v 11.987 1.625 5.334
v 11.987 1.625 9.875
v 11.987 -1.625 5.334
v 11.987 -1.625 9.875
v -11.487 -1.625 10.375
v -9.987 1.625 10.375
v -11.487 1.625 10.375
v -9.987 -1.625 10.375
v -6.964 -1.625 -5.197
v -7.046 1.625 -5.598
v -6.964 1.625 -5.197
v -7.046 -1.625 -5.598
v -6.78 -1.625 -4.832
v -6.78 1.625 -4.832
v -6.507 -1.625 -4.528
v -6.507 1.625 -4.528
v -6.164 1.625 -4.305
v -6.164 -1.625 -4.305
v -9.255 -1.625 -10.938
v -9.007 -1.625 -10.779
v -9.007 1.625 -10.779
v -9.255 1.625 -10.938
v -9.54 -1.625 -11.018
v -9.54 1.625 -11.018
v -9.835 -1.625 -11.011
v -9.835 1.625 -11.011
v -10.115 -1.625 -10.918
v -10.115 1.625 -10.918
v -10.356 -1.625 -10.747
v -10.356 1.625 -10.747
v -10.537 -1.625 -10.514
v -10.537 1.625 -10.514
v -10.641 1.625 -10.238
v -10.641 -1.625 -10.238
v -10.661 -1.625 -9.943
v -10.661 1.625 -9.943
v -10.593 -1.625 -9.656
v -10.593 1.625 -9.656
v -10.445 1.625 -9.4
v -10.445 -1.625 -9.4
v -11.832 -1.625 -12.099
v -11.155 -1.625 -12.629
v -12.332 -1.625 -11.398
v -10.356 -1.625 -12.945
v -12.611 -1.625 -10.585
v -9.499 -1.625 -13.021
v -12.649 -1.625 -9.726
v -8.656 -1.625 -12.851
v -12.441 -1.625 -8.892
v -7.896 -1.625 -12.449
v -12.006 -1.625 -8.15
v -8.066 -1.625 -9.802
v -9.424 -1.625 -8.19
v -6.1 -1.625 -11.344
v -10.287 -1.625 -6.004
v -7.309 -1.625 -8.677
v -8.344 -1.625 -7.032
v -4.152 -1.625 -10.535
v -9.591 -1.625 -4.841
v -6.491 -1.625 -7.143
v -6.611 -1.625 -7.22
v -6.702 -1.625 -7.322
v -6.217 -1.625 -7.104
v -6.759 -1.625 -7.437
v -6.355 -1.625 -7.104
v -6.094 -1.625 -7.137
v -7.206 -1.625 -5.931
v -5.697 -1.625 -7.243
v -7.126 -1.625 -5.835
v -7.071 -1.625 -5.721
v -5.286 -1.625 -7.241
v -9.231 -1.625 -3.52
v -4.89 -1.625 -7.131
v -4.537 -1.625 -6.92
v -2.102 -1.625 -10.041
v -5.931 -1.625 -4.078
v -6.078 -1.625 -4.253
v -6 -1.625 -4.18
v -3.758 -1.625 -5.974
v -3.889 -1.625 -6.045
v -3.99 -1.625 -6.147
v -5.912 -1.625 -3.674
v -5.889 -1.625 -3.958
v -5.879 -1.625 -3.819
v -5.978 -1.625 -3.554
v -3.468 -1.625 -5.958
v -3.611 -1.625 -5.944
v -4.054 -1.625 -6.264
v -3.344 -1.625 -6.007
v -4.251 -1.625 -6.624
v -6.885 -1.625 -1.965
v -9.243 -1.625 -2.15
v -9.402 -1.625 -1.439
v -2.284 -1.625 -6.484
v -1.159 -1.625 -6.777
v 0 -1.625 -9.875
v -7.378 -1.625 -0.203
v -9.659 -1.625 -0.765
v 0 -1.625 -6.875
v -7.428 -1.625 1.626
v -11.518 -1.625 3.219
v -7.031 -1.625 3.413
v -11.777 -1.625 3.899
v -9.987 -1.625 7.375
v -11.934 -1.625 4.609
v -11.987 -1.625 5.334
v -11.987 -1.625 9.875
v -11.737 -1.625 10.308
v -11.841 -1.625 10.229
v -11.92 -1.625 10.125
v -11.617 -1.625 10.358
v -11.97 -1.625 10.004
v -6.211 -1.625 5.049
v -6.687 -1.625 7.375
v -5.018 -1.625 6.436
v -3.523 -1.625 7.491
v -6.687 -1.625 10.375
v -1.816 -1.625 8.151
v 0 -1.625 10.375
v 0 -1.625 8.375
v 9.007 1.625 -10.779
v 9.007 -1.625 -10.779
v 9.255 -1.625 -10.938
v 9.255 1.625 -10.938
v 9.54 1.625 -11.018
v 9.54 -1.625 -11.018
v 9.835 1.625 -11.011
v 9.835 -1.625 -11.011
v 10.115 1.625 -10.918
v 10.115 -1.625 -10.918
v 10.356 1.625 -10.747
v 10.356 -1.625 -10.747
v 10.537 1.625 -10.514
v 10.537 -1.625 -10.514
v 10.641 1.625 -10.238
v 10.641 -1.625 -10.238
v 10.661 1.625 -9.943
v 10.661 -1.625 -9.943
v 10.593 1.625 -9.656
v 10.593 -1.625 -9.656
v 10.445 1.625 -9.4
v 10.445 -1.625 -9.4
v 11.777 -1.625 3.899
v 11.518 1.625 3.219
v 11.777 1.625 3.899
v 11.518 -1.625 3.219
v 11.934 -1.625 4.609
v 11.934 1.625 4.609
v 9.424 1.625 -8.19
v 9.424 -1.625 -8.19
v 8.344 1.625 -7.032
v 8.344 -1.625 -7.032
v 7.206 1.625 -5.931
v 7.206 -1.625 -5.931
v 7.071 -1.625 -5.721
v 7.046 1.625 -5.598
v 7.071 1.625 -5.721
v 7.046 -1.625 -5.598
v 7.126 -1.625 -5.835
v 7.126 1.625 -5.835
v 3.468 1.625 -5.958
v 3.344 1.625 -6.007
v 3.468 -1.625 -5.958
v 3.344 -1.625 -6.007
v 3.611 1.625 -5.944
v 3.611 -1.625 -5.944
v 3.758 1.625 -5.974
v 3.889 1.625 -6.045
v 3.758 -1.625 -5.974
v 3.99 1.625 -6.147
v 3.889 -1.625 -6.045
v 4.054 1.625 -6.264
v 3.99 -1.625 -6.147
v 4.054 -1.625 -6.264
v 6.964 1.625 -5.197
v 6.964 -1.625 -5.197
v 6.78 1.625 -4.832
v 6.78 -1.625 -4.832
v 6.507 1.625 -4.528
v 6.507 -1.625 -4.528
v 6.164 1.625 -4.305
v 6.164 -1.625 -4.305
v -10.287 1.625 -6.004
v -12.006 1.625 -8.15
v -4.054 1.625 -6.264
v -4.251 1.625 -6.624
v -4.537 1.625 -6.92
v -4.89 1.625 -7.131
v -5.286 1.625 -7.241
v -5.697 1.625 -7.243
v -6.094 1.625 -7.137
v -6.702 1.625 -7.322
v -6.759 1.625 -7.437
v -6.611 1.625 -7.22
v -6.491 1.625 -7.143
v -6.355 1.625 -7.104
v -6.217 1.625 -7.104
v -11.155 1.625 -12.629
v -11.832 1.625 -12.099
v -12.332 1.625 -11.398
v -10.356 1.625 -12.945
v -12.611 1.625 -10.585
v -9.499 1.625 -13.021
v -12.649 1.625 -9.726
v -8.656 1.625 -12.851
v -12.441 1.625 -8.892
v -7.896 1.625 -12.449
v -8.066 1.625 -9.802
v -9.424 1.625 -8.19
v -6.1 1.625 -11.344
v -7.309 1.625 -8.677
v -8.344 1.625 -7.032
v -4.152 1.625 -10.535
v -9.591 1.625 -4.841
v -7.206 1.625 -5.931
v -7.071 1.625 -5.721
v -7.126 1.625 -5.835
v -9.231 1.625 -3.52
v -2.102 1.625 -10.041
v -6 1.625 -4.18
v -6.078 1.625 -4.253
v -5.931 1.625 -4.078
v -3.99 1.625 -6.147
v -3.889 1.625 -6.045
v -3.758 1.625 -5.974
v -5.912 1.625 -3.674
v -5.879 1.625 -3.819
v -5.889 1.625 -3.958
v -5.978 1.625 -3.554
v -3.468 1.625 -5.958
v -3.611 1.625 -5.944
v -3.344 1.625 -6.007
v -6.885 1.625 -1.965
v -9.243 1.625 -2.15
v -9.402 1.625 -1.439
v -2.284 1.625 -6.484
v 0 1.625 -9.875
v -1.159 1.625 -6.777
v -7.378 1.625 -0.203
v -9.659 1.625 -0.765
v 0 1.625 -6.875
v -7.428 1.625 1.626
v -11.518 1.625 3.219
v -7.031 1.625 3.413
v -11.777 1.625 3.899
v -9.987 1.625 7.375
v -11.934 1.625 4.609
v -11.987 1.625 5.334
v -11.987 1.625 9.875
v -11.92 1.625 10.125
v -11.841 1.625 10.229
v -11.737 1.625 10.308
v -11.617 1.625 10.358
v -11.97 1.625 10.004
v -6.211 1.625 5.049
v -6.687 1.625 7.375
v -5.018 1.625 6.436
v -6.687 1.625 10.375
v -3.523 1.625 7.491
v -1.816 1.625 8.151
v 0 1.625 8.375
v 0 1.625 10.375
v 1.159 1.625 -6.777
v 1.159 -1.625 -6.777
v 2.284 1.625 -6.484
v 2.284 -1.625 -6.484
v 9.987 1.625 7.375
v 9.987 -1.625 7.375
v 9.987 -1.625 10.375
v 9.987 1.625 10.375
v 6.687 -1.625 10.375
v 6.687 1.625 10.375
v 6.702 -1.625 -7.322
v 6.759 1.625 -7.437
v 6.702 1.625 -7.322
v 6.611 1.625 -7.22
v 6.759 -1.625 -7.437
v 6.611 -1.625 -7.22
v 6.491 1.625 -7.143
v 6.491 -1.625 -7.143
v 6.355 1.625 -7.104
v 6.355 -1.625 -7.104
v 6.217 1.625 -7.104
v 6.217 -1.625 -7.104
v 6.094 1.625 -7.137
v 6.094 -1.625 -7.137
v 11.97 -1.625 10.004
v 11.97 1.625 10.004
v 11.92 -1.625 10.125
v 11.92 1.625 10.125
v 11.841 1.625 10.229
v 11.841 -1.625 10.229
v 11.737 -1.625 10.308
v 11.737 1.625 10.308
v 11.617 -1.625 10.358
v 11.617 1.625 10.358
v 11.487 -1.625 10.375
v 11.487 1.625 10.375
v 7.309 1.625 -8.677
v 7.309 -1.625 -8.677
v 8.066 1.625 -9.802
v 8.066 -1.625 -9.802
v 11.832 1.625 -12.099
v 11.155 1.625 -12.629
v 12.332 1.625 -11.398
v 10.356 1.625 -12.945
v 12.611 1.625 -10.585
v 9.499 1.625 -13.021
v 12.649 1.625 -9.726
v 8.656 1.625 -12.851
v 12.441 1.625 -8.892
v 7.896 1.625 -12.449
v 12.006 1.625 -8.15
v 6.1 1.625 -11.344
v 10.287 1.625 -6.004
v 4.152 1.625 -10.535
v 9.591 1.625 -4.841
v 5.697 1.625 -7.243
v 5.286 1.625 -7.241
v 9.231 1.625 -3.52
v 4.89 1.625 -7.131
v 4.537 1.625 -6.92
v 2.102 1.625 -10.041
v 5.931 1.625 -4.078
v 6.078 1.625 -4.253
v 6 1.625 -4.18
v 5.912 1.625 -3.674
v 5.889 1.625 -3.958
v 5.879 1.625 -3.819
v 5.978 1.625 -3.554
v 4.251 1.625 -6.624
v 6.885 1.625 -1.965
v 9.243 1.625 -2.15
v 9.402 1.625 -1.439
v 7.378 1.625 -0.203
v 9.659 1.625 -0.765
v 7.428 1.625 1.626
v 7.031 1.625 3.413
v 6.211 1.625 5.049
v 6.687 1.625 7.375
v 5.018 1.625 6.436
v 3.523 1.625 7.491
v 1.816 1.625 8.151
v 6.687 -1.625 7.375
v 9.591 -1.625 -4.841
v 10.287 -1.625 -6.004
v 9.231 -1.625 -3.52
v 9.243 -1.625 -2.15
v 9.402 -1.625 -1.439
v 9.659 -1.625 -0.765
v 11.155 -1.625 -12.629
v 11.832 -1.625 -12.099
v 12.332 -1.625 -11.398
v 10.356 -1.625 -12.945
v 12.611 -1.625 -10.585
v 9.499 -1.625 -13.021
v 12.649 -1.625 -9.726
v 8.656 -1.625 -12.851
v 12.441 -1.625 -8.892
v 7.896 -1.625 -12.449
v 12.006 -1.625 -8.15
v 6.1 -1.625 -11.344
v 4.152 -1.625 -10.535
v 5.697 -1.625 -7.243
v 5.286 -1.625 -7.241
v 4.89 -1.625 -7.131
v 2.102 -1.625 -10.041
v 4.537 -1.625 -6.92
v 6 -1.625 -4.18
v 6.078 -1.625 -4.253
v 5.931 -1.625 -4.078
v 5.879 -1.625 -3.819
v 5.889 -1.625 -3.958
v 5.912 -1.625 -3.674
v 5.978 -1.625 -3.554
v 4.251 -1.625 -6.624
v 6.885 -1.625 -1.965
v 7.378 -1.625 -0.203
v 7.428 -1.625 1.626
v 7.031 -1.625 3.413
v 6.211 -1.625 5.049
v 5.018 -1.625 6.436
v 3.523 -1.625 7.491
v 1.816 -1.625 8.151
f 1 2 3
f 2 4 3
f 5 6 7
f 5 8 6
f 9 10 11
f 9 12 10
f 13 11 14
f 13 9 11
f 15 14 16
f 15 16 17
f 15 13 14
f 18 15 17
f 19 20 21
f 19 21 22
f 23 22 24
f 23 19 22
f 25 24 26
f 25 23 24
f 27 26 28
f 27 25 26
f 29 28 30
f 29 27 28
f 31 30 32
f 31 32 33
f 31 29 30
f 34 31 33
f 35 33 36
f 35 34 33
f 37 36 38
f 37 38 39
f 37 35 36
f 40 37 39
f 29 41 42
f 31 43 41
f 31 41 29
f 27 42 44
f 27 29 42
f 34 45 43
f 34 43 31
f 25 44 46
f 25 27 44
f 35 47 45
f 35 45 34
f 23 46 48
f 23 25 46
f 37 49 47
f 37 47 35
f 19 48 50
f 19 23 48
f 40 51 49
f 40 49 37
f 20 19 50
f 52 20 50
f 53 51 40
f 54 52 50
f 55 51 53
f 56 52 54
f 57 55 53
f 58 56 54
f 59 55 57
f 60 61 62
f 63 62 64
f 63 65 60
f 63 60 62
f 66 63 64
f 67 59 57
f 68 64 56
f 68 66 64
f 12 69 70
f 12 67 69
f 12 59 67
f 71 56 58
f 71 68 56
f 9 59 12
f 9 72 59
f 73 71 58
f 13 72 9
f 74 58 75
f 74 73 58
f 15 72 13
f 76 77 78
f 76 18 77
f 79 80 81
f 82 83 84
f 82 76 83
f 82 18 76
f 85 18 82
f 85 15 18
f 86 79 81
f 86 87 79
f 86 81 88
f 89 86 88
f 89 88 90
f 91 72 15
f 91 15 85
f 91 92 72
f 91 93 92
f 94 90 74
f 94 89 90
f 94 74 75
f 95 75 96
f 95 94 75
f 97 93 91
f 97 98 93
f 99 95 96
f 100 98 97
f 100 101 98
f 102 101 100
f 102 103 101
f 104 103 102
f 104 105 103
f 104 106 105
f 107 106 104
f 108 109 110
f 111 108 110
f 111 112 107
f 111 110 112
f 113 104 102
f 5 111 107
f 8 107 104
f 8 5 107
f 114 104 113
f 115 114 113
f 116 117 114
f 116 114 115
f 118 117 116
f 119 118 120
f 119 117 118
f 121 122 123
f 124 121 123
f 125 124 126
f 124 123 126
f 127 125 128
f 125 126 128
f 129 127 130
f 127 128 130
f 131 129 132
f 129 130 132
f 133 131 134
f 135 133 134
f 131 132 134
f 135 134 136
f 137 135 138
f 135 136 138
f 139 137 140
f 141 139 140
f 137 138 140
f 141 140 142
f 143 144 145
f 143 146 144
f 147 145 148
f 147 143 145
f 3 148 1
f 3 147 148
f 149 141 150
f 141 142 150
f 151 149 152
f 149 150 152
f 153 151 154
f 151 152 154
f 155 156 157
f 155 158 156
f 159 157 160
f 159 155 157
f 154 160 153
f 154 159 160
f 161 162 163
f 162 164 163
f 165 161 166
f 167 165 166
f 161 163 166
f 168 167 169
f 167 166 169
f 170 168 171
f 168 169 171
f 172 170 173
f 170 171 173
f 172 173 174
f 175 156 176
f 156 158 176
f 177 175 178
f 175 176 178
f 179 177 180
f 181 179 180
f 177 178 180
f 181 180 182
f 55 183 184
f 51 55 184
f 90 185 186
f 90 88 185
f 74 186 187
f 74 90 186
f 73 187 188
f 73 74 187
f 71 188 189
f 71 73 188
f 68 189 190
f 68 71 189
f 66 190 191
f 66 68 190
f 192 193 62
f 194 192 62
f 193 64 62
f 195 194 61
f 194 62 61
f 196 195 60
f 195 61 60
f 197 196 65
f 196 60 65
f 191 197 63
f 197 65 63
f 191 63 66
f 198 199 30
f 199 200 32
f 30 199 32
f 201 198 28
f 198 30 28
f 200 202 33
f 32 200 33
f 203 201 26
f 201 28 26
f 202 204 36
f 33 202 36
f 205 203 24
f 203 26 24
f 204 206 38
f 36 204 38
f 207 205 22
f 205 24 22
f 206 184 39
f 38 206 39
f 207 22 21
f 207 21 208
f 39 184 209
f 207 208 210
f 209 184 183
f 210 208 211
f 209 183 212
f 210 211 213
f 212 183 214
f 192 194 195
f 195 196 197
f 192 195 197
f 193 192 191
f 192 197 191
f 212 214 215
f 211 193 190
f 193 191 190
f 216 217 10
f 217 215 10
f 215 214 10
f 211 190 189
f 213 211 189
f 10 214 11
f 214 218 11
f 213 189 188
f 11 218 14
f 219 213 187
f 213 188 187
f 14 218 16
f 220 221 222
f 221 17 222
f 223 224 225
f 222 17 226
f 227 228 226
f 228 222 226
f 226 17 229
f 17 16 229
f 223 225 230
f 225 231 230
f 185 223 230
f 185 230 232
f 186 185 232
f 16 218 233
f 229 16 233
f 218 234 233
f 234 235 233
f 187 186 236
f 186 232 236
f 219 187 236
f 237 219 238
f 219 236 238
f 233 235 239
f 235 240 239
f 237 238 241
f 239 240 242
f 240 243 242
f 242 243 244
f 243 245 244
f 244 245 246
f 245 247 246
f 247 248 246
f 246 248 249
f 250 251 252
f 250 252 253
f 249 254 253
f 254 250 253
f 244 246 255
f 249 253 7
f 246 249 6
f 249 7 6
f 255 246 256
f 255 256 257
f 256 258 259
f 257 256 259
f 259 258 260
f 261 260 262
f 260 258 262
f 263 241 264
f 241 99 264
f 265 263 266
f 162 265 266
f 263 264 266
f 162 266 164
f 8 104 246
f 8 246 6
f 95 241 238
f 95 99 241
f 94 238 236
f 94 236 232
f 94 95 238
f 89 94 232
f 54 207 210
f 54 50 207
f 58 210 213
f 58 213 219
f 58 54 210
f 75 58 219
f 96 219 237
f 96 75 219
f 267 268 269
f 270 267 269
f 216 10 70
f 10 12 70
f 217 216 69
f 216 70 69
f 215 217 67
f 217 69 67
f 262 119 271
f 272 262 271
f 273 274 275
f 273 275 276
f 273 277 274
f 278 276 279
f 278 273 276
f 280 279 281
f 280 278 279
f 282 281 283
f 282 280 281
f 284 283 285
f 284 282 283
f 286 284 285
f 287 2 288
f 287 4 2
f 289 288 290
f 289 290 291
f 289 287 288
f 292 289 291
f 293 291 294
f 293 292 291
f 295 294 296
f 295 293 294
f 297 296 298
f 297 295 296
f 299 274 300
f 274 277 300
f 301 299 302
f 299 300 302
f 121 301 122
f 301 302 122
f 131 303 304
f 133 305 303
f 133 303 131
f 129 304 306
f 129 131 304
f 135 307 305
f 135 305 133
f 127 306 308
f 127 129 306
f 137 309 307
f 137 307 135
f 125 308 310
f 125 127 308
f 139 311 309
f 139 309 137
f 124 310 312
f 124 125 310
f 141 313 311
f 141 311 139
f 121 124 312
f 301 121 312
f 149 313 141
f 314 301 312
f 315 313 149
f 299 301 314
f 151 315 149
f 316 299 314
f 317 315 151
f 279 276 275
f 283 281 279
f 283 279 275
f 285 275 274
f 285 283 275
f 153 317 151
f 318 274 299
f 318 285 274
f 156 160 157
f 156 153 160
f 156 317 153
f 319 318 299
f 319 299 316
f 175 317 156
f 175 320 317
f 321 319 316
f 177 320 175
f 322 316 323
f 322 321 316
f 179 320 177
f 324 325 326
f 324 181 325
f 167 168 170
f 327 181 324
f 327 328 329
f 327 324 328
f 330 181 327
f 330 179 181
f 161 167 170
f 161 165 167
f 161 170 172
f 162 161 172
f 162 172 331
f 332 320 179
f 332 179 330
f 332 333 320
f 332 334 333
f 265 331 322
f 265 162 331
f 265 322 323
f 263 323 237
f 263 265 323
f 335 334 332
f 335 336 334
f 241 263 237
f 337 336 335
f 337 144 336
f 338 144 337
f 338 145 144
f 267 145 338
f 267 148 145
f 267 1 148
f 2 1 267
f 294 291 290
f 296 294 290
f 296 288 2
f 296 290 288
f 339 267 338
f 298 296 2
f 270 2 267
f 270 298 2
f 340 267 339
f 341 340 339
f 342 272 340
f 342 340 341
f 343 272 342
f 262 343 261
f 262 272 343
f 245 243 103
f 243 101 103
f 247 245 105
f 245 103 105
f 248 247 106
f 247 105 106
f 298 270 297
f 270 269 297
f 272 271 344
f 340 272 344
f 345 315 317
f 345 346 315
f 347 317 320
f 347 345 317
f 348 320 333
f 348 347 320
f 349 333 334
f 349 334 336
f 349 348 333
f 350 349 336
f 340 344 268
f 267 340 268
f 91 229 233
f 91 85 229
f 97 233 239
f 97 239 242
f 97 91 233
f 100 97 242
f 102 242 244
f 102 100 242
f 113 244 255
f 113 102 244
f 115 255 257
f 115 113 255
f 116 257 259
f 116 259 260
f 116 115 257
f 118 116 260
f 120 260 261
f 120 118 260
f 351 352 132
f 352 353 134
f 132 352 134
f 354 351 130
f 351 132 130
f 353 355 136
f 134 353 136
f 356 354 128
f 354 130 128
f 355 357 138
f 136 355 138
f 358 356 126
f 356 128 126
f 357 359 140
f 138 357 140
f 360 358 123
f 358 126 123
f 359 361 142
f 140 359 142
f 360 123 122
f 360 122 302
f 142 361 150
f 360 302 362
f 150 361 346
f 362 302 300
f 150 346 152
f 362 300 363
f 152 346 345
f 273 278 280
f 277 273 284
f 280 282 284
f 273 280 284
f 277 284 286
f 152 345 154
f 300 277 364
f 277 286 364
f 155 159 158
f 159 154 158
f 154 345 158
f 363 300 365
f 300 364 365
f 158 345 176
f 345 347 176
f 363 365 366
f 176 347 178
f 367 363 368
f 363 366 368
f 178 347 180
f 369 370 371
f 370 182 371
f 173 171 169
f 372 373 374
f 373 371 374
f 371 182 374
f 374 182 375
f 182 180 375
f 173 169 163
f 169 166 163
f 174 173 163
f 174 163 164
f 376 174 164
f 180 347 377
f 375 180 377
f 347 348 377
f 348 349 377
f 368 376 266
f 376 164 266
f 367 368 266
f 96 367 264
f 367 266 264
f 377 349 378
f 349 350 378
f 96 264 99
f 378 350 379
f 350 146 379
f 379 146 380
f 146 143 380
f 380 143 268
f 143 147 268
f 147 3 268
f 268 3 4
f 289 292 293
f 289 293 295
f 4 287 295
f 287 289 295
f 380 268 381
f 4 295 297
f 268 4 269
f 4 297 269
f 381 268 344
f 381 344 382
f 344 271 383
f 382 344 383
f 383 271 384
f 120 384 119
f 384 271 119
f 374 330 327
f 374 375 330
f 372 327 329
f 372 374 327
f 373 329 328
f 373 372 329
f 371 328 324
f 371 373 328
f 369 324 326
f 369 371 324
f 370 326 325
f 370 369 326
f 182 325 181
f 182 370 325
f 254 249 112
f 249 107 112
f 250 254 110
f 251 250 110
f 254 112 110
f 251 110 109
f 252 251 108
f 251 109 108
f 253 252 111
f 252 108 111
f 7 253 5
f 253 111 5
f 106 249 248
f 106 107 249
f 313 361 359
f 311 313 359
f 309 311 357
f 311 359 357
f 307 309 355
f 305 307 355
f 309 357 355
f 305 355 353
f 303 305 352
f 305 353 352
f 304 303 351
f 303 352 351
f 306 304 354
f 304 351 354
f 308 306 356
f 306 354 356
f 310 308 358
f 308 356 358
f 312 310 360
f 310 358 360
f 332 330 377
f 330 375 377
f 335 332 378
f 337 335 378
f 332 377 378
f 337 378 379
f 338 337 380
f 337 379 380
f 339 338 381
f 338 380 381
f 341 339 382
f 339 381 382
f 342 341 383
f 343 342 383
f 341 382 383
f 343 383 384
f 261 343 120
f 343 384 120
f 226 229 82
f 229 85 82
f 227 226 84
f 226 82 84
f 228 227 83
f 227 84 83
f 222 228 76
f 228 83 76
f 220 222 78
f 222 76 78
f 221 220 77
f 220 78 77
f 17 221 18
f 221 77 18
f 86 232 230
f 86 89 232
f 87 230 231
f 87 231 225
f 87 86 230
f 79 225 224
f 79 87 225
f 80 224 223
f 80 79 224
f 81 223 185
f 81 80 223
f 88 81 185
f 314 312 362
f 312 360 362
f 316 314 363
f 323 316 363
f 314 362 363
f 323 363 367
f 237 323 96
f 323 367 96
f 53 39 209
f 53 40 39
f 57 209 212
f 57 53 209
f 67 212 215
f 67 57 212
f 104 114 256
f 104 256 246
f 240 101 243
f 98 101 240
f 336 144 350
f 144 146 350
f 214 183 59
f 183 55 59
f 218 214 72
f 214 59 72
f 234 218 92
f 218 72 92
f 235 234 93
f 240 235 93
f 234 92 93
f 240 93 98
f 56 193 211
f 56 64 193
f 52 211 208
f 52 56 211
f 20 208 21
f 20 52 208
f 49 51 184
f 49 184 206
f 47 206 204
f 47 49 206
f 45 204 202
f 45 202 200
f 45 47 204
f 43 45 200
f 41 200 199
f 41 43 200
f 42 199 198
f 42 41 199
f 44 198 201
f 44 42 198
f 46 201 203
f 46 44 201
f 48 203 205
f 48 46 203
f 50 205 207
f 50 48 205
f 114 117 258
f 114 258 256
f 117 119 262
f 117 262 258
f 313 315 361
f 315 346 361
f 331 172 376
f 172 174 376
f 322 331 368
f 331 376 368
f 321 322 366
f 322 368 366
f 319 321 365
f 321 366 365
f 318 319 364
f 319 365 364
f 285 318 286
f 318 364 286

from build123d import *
from build123d import SkipClean  # not in build123d's __all__

# Parameters (mm, degrees)
F2_DEPTH = 1.625
F3_R     = 0.5
F4_R     = 5


with BuildPart() as f2:
    # F1 (on Front) → F2 (new body, symmetric)
    with BuildSketch(Plane.XZ):
        with BuildLine():
            ThreePointArc((0, -6.875), (-2.0724417463, -6.5551971906), (-3.9520768911, -5.6255411515))
            ThreePointArc((-3.9520768911, -5.6255411515), (-4.8570002775, -7.1160909953), (-6.5757097792, -6.8217054979))
            ThreePointArc((-6.5757097792, -6.8217054979), (-7.4894639741, -8.9857797177), (-9.0066893746, -10.7791539234))
            ThreePointArc((-9.0066893746, -10.7791539234), (-10.3561219729, -10.7473840389), (-10.4445927673, -9.400479966))
            ThreePointArc((-10.4445927673, -9.400479966), (-8.8177667586, -7.5260240462), (-7.0479231089, -5.7859661986))
            ThreePointArc((-7.0479231089, -5.7859661986), (-6.6159518229, -4.6300438958), (-5.4766665535, -4.1559293139))
            ThreePointArc((-5.4766665535, -4.1559293139), (-6.837727437, 3.9011833784), (0, 8.375))
            Line((0, 8.375), (0, 10.375))
            Line((0, 10.375), (-6.6871520114, 10.375))
            Line((-6.6871520114, 10.375), (-6.6871520114, 7.375))
            Line((-6.6871520114, 7.375), (-9.9871520114, 7.375))
            Line((-9.9871520114, 7.375), (-9.9871520114, 10.375))
            Line((-9.9871520114, 10.375), (-11.9871520114, 10.375))
            Line((-11.9871520114, 10.375), (-11.9871520114, 4.2244328171))
            Line((-11.9871520114, 4.2244328171), (-8.5746230978, -3.0885299193))
            ThreePointArc((-8.5746230978, -3.0885299193), (-8.458137965, -3.3292198832), (-8.3348983214, -3.5665222959))
            Line((-8.3348983214, -3.5665222959), (-12.0057025921, -8.1503055323))
            ThreePointArc((-12.0057025921, -8.1503055323), (-11.8324993376, -12.098674705), (-7.8959026306, -12.4491384793))
            ThreePointArc((-7.8959026306, -12.4491384793), (-4.1524531082, -10.534781214), (0, -9.875))
            Line((0, -9.875), (0, -6.875))
        make_face()
    extrude(amount=F2_DEPTH, both=True)

    # F3
    f3_edges = [f2.edges().sort_by_distance(p)[0] for p in [
        (-3.952077, 0, -5.625541),
        (-7.047923, 0, -5.785966),
        (-11.987152, 0, 10.375),
        (-5.476667, 0, -4.155929),
        (-6.57571, 0, -6.821705),
    ]]
    fillet(f3_edges, radius=F3_R)

    # F4
    f4_edges = [f2.edges().sort_by_distance(p)[0] for p in [
        (-8.334898, 0, -3.566522),
        (-11.987152, 0, 4.224433),
    ]]
    fillet(f4_edges, radius=F4_R)

    # F5: F2 across plane


with BuildPart() as f2_1:
    add(f2.part, clean=False)
    with SkipClean():  # cleaning this boolean's faces spoils the solid; the shape is the same uncleaned
        add(f2.part.mirror(Plane.YZ), clean=False)


solid = f2_1.part
